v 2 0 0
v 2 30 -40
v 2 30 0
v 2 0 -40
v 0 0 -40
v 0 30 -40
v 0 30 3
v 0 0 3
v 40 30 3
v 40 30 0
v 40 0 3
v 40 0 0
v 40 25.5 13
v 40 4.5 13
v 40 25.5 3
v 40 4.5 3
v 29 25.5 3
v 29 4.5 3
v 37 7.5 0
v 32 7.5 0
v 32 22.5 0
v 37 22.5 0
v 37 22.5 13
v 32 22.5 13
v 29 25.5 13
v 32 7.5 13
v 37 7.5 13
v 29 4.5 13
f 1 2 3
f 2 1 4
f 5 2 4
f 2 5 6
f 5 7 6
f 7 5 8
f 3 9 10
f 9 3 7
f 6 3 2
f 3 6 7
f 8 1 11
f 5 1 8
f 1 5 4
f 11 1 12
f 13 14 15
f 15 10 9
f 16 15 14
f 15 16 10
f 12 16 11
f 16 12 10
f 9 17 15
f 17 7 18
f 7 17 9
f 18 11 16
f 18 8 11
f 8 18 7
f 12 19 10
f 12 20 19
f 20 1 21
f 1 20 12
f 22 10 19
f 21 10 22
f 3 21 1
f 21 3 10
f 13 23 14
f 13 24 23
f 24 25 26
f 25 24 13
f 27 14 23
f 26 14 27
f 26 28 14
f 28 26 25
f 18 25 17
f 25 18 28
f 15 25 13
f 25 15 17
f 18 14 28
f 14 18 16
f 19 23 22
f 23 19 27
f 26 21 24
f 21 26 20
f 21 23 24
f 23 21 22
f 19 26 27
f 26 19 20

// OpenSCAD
//use <MCAD/boxes.scad>

$fa = 1;
$fs = .4;

h1 = 40;
w1 = 2; // zmesti sa do skary?
d1 = 30;

h2 = 3; // zarovnane s vyskou dresu?
w2 = 40; // sirka medzery medzi chladnickou a dresom?
d2 = d1;

hole_wall = 3;
hole_h = 10;

stick_h = 160; // kolko sa zmesti na dosku?
stick_w = 5;
stick_d = 15;

press_fit = 0;
tight_fit = .13;
normal_fit = .250;
loose_fit = .5;

delta = .01;

// w, d, h

// Fitting
fitting_translation = [
    w2 - (hole_wall + stick_w + hole_wall),
    (d2 - (hole_wall + stick_d + hole_wall)) / 2,
    h2
];

// Base
difference() {
    union() {
        // Vertical part of base
        translate([0, 0, -h1])
            cube([w1, d1, h1 + delta]);

        // Horizontal part of base
        cube([w2, d2, h2]);

        translate(fitting_translation)
            cube([
                hole_wall + stick_w + hole_wall,
                hole_wall + stick_d + hole_wall,
                hole_h
            ]);
    };

    // Hole
    translate(fitting_translation)
        translate([hole_wall, hole_wall, -(h2 + delta)])
            cube([stick_w, stick_d, h2 + hole_h + 2*delta]);
};

//import("hippo.stl");

// difference() {
//     union() {
//         translate([0, 0, 2.5])
//             roundedCube([25, 50, 5], 5, sidesonly=true, center=true);

//         // TODO make sure these overlap with the roundedCube, I think now they overlap 0.0005 may be too little
//         translate([0, 10, -0.5])
//             cylinder(1.001, d=5.8, center=true);
//         translate([0, -10, -0.5])
//             cylinder(1.001, d=5.8, center=true);
//     }
//     // TODO this is not 1cm, see below
//     translate([0, 10, -0.5])
//         cylinder(10.001, d=5, center=true);
// }
//     translate([0, 10, -0.5])
//         cylinder(10.001, d=5, center=true);
